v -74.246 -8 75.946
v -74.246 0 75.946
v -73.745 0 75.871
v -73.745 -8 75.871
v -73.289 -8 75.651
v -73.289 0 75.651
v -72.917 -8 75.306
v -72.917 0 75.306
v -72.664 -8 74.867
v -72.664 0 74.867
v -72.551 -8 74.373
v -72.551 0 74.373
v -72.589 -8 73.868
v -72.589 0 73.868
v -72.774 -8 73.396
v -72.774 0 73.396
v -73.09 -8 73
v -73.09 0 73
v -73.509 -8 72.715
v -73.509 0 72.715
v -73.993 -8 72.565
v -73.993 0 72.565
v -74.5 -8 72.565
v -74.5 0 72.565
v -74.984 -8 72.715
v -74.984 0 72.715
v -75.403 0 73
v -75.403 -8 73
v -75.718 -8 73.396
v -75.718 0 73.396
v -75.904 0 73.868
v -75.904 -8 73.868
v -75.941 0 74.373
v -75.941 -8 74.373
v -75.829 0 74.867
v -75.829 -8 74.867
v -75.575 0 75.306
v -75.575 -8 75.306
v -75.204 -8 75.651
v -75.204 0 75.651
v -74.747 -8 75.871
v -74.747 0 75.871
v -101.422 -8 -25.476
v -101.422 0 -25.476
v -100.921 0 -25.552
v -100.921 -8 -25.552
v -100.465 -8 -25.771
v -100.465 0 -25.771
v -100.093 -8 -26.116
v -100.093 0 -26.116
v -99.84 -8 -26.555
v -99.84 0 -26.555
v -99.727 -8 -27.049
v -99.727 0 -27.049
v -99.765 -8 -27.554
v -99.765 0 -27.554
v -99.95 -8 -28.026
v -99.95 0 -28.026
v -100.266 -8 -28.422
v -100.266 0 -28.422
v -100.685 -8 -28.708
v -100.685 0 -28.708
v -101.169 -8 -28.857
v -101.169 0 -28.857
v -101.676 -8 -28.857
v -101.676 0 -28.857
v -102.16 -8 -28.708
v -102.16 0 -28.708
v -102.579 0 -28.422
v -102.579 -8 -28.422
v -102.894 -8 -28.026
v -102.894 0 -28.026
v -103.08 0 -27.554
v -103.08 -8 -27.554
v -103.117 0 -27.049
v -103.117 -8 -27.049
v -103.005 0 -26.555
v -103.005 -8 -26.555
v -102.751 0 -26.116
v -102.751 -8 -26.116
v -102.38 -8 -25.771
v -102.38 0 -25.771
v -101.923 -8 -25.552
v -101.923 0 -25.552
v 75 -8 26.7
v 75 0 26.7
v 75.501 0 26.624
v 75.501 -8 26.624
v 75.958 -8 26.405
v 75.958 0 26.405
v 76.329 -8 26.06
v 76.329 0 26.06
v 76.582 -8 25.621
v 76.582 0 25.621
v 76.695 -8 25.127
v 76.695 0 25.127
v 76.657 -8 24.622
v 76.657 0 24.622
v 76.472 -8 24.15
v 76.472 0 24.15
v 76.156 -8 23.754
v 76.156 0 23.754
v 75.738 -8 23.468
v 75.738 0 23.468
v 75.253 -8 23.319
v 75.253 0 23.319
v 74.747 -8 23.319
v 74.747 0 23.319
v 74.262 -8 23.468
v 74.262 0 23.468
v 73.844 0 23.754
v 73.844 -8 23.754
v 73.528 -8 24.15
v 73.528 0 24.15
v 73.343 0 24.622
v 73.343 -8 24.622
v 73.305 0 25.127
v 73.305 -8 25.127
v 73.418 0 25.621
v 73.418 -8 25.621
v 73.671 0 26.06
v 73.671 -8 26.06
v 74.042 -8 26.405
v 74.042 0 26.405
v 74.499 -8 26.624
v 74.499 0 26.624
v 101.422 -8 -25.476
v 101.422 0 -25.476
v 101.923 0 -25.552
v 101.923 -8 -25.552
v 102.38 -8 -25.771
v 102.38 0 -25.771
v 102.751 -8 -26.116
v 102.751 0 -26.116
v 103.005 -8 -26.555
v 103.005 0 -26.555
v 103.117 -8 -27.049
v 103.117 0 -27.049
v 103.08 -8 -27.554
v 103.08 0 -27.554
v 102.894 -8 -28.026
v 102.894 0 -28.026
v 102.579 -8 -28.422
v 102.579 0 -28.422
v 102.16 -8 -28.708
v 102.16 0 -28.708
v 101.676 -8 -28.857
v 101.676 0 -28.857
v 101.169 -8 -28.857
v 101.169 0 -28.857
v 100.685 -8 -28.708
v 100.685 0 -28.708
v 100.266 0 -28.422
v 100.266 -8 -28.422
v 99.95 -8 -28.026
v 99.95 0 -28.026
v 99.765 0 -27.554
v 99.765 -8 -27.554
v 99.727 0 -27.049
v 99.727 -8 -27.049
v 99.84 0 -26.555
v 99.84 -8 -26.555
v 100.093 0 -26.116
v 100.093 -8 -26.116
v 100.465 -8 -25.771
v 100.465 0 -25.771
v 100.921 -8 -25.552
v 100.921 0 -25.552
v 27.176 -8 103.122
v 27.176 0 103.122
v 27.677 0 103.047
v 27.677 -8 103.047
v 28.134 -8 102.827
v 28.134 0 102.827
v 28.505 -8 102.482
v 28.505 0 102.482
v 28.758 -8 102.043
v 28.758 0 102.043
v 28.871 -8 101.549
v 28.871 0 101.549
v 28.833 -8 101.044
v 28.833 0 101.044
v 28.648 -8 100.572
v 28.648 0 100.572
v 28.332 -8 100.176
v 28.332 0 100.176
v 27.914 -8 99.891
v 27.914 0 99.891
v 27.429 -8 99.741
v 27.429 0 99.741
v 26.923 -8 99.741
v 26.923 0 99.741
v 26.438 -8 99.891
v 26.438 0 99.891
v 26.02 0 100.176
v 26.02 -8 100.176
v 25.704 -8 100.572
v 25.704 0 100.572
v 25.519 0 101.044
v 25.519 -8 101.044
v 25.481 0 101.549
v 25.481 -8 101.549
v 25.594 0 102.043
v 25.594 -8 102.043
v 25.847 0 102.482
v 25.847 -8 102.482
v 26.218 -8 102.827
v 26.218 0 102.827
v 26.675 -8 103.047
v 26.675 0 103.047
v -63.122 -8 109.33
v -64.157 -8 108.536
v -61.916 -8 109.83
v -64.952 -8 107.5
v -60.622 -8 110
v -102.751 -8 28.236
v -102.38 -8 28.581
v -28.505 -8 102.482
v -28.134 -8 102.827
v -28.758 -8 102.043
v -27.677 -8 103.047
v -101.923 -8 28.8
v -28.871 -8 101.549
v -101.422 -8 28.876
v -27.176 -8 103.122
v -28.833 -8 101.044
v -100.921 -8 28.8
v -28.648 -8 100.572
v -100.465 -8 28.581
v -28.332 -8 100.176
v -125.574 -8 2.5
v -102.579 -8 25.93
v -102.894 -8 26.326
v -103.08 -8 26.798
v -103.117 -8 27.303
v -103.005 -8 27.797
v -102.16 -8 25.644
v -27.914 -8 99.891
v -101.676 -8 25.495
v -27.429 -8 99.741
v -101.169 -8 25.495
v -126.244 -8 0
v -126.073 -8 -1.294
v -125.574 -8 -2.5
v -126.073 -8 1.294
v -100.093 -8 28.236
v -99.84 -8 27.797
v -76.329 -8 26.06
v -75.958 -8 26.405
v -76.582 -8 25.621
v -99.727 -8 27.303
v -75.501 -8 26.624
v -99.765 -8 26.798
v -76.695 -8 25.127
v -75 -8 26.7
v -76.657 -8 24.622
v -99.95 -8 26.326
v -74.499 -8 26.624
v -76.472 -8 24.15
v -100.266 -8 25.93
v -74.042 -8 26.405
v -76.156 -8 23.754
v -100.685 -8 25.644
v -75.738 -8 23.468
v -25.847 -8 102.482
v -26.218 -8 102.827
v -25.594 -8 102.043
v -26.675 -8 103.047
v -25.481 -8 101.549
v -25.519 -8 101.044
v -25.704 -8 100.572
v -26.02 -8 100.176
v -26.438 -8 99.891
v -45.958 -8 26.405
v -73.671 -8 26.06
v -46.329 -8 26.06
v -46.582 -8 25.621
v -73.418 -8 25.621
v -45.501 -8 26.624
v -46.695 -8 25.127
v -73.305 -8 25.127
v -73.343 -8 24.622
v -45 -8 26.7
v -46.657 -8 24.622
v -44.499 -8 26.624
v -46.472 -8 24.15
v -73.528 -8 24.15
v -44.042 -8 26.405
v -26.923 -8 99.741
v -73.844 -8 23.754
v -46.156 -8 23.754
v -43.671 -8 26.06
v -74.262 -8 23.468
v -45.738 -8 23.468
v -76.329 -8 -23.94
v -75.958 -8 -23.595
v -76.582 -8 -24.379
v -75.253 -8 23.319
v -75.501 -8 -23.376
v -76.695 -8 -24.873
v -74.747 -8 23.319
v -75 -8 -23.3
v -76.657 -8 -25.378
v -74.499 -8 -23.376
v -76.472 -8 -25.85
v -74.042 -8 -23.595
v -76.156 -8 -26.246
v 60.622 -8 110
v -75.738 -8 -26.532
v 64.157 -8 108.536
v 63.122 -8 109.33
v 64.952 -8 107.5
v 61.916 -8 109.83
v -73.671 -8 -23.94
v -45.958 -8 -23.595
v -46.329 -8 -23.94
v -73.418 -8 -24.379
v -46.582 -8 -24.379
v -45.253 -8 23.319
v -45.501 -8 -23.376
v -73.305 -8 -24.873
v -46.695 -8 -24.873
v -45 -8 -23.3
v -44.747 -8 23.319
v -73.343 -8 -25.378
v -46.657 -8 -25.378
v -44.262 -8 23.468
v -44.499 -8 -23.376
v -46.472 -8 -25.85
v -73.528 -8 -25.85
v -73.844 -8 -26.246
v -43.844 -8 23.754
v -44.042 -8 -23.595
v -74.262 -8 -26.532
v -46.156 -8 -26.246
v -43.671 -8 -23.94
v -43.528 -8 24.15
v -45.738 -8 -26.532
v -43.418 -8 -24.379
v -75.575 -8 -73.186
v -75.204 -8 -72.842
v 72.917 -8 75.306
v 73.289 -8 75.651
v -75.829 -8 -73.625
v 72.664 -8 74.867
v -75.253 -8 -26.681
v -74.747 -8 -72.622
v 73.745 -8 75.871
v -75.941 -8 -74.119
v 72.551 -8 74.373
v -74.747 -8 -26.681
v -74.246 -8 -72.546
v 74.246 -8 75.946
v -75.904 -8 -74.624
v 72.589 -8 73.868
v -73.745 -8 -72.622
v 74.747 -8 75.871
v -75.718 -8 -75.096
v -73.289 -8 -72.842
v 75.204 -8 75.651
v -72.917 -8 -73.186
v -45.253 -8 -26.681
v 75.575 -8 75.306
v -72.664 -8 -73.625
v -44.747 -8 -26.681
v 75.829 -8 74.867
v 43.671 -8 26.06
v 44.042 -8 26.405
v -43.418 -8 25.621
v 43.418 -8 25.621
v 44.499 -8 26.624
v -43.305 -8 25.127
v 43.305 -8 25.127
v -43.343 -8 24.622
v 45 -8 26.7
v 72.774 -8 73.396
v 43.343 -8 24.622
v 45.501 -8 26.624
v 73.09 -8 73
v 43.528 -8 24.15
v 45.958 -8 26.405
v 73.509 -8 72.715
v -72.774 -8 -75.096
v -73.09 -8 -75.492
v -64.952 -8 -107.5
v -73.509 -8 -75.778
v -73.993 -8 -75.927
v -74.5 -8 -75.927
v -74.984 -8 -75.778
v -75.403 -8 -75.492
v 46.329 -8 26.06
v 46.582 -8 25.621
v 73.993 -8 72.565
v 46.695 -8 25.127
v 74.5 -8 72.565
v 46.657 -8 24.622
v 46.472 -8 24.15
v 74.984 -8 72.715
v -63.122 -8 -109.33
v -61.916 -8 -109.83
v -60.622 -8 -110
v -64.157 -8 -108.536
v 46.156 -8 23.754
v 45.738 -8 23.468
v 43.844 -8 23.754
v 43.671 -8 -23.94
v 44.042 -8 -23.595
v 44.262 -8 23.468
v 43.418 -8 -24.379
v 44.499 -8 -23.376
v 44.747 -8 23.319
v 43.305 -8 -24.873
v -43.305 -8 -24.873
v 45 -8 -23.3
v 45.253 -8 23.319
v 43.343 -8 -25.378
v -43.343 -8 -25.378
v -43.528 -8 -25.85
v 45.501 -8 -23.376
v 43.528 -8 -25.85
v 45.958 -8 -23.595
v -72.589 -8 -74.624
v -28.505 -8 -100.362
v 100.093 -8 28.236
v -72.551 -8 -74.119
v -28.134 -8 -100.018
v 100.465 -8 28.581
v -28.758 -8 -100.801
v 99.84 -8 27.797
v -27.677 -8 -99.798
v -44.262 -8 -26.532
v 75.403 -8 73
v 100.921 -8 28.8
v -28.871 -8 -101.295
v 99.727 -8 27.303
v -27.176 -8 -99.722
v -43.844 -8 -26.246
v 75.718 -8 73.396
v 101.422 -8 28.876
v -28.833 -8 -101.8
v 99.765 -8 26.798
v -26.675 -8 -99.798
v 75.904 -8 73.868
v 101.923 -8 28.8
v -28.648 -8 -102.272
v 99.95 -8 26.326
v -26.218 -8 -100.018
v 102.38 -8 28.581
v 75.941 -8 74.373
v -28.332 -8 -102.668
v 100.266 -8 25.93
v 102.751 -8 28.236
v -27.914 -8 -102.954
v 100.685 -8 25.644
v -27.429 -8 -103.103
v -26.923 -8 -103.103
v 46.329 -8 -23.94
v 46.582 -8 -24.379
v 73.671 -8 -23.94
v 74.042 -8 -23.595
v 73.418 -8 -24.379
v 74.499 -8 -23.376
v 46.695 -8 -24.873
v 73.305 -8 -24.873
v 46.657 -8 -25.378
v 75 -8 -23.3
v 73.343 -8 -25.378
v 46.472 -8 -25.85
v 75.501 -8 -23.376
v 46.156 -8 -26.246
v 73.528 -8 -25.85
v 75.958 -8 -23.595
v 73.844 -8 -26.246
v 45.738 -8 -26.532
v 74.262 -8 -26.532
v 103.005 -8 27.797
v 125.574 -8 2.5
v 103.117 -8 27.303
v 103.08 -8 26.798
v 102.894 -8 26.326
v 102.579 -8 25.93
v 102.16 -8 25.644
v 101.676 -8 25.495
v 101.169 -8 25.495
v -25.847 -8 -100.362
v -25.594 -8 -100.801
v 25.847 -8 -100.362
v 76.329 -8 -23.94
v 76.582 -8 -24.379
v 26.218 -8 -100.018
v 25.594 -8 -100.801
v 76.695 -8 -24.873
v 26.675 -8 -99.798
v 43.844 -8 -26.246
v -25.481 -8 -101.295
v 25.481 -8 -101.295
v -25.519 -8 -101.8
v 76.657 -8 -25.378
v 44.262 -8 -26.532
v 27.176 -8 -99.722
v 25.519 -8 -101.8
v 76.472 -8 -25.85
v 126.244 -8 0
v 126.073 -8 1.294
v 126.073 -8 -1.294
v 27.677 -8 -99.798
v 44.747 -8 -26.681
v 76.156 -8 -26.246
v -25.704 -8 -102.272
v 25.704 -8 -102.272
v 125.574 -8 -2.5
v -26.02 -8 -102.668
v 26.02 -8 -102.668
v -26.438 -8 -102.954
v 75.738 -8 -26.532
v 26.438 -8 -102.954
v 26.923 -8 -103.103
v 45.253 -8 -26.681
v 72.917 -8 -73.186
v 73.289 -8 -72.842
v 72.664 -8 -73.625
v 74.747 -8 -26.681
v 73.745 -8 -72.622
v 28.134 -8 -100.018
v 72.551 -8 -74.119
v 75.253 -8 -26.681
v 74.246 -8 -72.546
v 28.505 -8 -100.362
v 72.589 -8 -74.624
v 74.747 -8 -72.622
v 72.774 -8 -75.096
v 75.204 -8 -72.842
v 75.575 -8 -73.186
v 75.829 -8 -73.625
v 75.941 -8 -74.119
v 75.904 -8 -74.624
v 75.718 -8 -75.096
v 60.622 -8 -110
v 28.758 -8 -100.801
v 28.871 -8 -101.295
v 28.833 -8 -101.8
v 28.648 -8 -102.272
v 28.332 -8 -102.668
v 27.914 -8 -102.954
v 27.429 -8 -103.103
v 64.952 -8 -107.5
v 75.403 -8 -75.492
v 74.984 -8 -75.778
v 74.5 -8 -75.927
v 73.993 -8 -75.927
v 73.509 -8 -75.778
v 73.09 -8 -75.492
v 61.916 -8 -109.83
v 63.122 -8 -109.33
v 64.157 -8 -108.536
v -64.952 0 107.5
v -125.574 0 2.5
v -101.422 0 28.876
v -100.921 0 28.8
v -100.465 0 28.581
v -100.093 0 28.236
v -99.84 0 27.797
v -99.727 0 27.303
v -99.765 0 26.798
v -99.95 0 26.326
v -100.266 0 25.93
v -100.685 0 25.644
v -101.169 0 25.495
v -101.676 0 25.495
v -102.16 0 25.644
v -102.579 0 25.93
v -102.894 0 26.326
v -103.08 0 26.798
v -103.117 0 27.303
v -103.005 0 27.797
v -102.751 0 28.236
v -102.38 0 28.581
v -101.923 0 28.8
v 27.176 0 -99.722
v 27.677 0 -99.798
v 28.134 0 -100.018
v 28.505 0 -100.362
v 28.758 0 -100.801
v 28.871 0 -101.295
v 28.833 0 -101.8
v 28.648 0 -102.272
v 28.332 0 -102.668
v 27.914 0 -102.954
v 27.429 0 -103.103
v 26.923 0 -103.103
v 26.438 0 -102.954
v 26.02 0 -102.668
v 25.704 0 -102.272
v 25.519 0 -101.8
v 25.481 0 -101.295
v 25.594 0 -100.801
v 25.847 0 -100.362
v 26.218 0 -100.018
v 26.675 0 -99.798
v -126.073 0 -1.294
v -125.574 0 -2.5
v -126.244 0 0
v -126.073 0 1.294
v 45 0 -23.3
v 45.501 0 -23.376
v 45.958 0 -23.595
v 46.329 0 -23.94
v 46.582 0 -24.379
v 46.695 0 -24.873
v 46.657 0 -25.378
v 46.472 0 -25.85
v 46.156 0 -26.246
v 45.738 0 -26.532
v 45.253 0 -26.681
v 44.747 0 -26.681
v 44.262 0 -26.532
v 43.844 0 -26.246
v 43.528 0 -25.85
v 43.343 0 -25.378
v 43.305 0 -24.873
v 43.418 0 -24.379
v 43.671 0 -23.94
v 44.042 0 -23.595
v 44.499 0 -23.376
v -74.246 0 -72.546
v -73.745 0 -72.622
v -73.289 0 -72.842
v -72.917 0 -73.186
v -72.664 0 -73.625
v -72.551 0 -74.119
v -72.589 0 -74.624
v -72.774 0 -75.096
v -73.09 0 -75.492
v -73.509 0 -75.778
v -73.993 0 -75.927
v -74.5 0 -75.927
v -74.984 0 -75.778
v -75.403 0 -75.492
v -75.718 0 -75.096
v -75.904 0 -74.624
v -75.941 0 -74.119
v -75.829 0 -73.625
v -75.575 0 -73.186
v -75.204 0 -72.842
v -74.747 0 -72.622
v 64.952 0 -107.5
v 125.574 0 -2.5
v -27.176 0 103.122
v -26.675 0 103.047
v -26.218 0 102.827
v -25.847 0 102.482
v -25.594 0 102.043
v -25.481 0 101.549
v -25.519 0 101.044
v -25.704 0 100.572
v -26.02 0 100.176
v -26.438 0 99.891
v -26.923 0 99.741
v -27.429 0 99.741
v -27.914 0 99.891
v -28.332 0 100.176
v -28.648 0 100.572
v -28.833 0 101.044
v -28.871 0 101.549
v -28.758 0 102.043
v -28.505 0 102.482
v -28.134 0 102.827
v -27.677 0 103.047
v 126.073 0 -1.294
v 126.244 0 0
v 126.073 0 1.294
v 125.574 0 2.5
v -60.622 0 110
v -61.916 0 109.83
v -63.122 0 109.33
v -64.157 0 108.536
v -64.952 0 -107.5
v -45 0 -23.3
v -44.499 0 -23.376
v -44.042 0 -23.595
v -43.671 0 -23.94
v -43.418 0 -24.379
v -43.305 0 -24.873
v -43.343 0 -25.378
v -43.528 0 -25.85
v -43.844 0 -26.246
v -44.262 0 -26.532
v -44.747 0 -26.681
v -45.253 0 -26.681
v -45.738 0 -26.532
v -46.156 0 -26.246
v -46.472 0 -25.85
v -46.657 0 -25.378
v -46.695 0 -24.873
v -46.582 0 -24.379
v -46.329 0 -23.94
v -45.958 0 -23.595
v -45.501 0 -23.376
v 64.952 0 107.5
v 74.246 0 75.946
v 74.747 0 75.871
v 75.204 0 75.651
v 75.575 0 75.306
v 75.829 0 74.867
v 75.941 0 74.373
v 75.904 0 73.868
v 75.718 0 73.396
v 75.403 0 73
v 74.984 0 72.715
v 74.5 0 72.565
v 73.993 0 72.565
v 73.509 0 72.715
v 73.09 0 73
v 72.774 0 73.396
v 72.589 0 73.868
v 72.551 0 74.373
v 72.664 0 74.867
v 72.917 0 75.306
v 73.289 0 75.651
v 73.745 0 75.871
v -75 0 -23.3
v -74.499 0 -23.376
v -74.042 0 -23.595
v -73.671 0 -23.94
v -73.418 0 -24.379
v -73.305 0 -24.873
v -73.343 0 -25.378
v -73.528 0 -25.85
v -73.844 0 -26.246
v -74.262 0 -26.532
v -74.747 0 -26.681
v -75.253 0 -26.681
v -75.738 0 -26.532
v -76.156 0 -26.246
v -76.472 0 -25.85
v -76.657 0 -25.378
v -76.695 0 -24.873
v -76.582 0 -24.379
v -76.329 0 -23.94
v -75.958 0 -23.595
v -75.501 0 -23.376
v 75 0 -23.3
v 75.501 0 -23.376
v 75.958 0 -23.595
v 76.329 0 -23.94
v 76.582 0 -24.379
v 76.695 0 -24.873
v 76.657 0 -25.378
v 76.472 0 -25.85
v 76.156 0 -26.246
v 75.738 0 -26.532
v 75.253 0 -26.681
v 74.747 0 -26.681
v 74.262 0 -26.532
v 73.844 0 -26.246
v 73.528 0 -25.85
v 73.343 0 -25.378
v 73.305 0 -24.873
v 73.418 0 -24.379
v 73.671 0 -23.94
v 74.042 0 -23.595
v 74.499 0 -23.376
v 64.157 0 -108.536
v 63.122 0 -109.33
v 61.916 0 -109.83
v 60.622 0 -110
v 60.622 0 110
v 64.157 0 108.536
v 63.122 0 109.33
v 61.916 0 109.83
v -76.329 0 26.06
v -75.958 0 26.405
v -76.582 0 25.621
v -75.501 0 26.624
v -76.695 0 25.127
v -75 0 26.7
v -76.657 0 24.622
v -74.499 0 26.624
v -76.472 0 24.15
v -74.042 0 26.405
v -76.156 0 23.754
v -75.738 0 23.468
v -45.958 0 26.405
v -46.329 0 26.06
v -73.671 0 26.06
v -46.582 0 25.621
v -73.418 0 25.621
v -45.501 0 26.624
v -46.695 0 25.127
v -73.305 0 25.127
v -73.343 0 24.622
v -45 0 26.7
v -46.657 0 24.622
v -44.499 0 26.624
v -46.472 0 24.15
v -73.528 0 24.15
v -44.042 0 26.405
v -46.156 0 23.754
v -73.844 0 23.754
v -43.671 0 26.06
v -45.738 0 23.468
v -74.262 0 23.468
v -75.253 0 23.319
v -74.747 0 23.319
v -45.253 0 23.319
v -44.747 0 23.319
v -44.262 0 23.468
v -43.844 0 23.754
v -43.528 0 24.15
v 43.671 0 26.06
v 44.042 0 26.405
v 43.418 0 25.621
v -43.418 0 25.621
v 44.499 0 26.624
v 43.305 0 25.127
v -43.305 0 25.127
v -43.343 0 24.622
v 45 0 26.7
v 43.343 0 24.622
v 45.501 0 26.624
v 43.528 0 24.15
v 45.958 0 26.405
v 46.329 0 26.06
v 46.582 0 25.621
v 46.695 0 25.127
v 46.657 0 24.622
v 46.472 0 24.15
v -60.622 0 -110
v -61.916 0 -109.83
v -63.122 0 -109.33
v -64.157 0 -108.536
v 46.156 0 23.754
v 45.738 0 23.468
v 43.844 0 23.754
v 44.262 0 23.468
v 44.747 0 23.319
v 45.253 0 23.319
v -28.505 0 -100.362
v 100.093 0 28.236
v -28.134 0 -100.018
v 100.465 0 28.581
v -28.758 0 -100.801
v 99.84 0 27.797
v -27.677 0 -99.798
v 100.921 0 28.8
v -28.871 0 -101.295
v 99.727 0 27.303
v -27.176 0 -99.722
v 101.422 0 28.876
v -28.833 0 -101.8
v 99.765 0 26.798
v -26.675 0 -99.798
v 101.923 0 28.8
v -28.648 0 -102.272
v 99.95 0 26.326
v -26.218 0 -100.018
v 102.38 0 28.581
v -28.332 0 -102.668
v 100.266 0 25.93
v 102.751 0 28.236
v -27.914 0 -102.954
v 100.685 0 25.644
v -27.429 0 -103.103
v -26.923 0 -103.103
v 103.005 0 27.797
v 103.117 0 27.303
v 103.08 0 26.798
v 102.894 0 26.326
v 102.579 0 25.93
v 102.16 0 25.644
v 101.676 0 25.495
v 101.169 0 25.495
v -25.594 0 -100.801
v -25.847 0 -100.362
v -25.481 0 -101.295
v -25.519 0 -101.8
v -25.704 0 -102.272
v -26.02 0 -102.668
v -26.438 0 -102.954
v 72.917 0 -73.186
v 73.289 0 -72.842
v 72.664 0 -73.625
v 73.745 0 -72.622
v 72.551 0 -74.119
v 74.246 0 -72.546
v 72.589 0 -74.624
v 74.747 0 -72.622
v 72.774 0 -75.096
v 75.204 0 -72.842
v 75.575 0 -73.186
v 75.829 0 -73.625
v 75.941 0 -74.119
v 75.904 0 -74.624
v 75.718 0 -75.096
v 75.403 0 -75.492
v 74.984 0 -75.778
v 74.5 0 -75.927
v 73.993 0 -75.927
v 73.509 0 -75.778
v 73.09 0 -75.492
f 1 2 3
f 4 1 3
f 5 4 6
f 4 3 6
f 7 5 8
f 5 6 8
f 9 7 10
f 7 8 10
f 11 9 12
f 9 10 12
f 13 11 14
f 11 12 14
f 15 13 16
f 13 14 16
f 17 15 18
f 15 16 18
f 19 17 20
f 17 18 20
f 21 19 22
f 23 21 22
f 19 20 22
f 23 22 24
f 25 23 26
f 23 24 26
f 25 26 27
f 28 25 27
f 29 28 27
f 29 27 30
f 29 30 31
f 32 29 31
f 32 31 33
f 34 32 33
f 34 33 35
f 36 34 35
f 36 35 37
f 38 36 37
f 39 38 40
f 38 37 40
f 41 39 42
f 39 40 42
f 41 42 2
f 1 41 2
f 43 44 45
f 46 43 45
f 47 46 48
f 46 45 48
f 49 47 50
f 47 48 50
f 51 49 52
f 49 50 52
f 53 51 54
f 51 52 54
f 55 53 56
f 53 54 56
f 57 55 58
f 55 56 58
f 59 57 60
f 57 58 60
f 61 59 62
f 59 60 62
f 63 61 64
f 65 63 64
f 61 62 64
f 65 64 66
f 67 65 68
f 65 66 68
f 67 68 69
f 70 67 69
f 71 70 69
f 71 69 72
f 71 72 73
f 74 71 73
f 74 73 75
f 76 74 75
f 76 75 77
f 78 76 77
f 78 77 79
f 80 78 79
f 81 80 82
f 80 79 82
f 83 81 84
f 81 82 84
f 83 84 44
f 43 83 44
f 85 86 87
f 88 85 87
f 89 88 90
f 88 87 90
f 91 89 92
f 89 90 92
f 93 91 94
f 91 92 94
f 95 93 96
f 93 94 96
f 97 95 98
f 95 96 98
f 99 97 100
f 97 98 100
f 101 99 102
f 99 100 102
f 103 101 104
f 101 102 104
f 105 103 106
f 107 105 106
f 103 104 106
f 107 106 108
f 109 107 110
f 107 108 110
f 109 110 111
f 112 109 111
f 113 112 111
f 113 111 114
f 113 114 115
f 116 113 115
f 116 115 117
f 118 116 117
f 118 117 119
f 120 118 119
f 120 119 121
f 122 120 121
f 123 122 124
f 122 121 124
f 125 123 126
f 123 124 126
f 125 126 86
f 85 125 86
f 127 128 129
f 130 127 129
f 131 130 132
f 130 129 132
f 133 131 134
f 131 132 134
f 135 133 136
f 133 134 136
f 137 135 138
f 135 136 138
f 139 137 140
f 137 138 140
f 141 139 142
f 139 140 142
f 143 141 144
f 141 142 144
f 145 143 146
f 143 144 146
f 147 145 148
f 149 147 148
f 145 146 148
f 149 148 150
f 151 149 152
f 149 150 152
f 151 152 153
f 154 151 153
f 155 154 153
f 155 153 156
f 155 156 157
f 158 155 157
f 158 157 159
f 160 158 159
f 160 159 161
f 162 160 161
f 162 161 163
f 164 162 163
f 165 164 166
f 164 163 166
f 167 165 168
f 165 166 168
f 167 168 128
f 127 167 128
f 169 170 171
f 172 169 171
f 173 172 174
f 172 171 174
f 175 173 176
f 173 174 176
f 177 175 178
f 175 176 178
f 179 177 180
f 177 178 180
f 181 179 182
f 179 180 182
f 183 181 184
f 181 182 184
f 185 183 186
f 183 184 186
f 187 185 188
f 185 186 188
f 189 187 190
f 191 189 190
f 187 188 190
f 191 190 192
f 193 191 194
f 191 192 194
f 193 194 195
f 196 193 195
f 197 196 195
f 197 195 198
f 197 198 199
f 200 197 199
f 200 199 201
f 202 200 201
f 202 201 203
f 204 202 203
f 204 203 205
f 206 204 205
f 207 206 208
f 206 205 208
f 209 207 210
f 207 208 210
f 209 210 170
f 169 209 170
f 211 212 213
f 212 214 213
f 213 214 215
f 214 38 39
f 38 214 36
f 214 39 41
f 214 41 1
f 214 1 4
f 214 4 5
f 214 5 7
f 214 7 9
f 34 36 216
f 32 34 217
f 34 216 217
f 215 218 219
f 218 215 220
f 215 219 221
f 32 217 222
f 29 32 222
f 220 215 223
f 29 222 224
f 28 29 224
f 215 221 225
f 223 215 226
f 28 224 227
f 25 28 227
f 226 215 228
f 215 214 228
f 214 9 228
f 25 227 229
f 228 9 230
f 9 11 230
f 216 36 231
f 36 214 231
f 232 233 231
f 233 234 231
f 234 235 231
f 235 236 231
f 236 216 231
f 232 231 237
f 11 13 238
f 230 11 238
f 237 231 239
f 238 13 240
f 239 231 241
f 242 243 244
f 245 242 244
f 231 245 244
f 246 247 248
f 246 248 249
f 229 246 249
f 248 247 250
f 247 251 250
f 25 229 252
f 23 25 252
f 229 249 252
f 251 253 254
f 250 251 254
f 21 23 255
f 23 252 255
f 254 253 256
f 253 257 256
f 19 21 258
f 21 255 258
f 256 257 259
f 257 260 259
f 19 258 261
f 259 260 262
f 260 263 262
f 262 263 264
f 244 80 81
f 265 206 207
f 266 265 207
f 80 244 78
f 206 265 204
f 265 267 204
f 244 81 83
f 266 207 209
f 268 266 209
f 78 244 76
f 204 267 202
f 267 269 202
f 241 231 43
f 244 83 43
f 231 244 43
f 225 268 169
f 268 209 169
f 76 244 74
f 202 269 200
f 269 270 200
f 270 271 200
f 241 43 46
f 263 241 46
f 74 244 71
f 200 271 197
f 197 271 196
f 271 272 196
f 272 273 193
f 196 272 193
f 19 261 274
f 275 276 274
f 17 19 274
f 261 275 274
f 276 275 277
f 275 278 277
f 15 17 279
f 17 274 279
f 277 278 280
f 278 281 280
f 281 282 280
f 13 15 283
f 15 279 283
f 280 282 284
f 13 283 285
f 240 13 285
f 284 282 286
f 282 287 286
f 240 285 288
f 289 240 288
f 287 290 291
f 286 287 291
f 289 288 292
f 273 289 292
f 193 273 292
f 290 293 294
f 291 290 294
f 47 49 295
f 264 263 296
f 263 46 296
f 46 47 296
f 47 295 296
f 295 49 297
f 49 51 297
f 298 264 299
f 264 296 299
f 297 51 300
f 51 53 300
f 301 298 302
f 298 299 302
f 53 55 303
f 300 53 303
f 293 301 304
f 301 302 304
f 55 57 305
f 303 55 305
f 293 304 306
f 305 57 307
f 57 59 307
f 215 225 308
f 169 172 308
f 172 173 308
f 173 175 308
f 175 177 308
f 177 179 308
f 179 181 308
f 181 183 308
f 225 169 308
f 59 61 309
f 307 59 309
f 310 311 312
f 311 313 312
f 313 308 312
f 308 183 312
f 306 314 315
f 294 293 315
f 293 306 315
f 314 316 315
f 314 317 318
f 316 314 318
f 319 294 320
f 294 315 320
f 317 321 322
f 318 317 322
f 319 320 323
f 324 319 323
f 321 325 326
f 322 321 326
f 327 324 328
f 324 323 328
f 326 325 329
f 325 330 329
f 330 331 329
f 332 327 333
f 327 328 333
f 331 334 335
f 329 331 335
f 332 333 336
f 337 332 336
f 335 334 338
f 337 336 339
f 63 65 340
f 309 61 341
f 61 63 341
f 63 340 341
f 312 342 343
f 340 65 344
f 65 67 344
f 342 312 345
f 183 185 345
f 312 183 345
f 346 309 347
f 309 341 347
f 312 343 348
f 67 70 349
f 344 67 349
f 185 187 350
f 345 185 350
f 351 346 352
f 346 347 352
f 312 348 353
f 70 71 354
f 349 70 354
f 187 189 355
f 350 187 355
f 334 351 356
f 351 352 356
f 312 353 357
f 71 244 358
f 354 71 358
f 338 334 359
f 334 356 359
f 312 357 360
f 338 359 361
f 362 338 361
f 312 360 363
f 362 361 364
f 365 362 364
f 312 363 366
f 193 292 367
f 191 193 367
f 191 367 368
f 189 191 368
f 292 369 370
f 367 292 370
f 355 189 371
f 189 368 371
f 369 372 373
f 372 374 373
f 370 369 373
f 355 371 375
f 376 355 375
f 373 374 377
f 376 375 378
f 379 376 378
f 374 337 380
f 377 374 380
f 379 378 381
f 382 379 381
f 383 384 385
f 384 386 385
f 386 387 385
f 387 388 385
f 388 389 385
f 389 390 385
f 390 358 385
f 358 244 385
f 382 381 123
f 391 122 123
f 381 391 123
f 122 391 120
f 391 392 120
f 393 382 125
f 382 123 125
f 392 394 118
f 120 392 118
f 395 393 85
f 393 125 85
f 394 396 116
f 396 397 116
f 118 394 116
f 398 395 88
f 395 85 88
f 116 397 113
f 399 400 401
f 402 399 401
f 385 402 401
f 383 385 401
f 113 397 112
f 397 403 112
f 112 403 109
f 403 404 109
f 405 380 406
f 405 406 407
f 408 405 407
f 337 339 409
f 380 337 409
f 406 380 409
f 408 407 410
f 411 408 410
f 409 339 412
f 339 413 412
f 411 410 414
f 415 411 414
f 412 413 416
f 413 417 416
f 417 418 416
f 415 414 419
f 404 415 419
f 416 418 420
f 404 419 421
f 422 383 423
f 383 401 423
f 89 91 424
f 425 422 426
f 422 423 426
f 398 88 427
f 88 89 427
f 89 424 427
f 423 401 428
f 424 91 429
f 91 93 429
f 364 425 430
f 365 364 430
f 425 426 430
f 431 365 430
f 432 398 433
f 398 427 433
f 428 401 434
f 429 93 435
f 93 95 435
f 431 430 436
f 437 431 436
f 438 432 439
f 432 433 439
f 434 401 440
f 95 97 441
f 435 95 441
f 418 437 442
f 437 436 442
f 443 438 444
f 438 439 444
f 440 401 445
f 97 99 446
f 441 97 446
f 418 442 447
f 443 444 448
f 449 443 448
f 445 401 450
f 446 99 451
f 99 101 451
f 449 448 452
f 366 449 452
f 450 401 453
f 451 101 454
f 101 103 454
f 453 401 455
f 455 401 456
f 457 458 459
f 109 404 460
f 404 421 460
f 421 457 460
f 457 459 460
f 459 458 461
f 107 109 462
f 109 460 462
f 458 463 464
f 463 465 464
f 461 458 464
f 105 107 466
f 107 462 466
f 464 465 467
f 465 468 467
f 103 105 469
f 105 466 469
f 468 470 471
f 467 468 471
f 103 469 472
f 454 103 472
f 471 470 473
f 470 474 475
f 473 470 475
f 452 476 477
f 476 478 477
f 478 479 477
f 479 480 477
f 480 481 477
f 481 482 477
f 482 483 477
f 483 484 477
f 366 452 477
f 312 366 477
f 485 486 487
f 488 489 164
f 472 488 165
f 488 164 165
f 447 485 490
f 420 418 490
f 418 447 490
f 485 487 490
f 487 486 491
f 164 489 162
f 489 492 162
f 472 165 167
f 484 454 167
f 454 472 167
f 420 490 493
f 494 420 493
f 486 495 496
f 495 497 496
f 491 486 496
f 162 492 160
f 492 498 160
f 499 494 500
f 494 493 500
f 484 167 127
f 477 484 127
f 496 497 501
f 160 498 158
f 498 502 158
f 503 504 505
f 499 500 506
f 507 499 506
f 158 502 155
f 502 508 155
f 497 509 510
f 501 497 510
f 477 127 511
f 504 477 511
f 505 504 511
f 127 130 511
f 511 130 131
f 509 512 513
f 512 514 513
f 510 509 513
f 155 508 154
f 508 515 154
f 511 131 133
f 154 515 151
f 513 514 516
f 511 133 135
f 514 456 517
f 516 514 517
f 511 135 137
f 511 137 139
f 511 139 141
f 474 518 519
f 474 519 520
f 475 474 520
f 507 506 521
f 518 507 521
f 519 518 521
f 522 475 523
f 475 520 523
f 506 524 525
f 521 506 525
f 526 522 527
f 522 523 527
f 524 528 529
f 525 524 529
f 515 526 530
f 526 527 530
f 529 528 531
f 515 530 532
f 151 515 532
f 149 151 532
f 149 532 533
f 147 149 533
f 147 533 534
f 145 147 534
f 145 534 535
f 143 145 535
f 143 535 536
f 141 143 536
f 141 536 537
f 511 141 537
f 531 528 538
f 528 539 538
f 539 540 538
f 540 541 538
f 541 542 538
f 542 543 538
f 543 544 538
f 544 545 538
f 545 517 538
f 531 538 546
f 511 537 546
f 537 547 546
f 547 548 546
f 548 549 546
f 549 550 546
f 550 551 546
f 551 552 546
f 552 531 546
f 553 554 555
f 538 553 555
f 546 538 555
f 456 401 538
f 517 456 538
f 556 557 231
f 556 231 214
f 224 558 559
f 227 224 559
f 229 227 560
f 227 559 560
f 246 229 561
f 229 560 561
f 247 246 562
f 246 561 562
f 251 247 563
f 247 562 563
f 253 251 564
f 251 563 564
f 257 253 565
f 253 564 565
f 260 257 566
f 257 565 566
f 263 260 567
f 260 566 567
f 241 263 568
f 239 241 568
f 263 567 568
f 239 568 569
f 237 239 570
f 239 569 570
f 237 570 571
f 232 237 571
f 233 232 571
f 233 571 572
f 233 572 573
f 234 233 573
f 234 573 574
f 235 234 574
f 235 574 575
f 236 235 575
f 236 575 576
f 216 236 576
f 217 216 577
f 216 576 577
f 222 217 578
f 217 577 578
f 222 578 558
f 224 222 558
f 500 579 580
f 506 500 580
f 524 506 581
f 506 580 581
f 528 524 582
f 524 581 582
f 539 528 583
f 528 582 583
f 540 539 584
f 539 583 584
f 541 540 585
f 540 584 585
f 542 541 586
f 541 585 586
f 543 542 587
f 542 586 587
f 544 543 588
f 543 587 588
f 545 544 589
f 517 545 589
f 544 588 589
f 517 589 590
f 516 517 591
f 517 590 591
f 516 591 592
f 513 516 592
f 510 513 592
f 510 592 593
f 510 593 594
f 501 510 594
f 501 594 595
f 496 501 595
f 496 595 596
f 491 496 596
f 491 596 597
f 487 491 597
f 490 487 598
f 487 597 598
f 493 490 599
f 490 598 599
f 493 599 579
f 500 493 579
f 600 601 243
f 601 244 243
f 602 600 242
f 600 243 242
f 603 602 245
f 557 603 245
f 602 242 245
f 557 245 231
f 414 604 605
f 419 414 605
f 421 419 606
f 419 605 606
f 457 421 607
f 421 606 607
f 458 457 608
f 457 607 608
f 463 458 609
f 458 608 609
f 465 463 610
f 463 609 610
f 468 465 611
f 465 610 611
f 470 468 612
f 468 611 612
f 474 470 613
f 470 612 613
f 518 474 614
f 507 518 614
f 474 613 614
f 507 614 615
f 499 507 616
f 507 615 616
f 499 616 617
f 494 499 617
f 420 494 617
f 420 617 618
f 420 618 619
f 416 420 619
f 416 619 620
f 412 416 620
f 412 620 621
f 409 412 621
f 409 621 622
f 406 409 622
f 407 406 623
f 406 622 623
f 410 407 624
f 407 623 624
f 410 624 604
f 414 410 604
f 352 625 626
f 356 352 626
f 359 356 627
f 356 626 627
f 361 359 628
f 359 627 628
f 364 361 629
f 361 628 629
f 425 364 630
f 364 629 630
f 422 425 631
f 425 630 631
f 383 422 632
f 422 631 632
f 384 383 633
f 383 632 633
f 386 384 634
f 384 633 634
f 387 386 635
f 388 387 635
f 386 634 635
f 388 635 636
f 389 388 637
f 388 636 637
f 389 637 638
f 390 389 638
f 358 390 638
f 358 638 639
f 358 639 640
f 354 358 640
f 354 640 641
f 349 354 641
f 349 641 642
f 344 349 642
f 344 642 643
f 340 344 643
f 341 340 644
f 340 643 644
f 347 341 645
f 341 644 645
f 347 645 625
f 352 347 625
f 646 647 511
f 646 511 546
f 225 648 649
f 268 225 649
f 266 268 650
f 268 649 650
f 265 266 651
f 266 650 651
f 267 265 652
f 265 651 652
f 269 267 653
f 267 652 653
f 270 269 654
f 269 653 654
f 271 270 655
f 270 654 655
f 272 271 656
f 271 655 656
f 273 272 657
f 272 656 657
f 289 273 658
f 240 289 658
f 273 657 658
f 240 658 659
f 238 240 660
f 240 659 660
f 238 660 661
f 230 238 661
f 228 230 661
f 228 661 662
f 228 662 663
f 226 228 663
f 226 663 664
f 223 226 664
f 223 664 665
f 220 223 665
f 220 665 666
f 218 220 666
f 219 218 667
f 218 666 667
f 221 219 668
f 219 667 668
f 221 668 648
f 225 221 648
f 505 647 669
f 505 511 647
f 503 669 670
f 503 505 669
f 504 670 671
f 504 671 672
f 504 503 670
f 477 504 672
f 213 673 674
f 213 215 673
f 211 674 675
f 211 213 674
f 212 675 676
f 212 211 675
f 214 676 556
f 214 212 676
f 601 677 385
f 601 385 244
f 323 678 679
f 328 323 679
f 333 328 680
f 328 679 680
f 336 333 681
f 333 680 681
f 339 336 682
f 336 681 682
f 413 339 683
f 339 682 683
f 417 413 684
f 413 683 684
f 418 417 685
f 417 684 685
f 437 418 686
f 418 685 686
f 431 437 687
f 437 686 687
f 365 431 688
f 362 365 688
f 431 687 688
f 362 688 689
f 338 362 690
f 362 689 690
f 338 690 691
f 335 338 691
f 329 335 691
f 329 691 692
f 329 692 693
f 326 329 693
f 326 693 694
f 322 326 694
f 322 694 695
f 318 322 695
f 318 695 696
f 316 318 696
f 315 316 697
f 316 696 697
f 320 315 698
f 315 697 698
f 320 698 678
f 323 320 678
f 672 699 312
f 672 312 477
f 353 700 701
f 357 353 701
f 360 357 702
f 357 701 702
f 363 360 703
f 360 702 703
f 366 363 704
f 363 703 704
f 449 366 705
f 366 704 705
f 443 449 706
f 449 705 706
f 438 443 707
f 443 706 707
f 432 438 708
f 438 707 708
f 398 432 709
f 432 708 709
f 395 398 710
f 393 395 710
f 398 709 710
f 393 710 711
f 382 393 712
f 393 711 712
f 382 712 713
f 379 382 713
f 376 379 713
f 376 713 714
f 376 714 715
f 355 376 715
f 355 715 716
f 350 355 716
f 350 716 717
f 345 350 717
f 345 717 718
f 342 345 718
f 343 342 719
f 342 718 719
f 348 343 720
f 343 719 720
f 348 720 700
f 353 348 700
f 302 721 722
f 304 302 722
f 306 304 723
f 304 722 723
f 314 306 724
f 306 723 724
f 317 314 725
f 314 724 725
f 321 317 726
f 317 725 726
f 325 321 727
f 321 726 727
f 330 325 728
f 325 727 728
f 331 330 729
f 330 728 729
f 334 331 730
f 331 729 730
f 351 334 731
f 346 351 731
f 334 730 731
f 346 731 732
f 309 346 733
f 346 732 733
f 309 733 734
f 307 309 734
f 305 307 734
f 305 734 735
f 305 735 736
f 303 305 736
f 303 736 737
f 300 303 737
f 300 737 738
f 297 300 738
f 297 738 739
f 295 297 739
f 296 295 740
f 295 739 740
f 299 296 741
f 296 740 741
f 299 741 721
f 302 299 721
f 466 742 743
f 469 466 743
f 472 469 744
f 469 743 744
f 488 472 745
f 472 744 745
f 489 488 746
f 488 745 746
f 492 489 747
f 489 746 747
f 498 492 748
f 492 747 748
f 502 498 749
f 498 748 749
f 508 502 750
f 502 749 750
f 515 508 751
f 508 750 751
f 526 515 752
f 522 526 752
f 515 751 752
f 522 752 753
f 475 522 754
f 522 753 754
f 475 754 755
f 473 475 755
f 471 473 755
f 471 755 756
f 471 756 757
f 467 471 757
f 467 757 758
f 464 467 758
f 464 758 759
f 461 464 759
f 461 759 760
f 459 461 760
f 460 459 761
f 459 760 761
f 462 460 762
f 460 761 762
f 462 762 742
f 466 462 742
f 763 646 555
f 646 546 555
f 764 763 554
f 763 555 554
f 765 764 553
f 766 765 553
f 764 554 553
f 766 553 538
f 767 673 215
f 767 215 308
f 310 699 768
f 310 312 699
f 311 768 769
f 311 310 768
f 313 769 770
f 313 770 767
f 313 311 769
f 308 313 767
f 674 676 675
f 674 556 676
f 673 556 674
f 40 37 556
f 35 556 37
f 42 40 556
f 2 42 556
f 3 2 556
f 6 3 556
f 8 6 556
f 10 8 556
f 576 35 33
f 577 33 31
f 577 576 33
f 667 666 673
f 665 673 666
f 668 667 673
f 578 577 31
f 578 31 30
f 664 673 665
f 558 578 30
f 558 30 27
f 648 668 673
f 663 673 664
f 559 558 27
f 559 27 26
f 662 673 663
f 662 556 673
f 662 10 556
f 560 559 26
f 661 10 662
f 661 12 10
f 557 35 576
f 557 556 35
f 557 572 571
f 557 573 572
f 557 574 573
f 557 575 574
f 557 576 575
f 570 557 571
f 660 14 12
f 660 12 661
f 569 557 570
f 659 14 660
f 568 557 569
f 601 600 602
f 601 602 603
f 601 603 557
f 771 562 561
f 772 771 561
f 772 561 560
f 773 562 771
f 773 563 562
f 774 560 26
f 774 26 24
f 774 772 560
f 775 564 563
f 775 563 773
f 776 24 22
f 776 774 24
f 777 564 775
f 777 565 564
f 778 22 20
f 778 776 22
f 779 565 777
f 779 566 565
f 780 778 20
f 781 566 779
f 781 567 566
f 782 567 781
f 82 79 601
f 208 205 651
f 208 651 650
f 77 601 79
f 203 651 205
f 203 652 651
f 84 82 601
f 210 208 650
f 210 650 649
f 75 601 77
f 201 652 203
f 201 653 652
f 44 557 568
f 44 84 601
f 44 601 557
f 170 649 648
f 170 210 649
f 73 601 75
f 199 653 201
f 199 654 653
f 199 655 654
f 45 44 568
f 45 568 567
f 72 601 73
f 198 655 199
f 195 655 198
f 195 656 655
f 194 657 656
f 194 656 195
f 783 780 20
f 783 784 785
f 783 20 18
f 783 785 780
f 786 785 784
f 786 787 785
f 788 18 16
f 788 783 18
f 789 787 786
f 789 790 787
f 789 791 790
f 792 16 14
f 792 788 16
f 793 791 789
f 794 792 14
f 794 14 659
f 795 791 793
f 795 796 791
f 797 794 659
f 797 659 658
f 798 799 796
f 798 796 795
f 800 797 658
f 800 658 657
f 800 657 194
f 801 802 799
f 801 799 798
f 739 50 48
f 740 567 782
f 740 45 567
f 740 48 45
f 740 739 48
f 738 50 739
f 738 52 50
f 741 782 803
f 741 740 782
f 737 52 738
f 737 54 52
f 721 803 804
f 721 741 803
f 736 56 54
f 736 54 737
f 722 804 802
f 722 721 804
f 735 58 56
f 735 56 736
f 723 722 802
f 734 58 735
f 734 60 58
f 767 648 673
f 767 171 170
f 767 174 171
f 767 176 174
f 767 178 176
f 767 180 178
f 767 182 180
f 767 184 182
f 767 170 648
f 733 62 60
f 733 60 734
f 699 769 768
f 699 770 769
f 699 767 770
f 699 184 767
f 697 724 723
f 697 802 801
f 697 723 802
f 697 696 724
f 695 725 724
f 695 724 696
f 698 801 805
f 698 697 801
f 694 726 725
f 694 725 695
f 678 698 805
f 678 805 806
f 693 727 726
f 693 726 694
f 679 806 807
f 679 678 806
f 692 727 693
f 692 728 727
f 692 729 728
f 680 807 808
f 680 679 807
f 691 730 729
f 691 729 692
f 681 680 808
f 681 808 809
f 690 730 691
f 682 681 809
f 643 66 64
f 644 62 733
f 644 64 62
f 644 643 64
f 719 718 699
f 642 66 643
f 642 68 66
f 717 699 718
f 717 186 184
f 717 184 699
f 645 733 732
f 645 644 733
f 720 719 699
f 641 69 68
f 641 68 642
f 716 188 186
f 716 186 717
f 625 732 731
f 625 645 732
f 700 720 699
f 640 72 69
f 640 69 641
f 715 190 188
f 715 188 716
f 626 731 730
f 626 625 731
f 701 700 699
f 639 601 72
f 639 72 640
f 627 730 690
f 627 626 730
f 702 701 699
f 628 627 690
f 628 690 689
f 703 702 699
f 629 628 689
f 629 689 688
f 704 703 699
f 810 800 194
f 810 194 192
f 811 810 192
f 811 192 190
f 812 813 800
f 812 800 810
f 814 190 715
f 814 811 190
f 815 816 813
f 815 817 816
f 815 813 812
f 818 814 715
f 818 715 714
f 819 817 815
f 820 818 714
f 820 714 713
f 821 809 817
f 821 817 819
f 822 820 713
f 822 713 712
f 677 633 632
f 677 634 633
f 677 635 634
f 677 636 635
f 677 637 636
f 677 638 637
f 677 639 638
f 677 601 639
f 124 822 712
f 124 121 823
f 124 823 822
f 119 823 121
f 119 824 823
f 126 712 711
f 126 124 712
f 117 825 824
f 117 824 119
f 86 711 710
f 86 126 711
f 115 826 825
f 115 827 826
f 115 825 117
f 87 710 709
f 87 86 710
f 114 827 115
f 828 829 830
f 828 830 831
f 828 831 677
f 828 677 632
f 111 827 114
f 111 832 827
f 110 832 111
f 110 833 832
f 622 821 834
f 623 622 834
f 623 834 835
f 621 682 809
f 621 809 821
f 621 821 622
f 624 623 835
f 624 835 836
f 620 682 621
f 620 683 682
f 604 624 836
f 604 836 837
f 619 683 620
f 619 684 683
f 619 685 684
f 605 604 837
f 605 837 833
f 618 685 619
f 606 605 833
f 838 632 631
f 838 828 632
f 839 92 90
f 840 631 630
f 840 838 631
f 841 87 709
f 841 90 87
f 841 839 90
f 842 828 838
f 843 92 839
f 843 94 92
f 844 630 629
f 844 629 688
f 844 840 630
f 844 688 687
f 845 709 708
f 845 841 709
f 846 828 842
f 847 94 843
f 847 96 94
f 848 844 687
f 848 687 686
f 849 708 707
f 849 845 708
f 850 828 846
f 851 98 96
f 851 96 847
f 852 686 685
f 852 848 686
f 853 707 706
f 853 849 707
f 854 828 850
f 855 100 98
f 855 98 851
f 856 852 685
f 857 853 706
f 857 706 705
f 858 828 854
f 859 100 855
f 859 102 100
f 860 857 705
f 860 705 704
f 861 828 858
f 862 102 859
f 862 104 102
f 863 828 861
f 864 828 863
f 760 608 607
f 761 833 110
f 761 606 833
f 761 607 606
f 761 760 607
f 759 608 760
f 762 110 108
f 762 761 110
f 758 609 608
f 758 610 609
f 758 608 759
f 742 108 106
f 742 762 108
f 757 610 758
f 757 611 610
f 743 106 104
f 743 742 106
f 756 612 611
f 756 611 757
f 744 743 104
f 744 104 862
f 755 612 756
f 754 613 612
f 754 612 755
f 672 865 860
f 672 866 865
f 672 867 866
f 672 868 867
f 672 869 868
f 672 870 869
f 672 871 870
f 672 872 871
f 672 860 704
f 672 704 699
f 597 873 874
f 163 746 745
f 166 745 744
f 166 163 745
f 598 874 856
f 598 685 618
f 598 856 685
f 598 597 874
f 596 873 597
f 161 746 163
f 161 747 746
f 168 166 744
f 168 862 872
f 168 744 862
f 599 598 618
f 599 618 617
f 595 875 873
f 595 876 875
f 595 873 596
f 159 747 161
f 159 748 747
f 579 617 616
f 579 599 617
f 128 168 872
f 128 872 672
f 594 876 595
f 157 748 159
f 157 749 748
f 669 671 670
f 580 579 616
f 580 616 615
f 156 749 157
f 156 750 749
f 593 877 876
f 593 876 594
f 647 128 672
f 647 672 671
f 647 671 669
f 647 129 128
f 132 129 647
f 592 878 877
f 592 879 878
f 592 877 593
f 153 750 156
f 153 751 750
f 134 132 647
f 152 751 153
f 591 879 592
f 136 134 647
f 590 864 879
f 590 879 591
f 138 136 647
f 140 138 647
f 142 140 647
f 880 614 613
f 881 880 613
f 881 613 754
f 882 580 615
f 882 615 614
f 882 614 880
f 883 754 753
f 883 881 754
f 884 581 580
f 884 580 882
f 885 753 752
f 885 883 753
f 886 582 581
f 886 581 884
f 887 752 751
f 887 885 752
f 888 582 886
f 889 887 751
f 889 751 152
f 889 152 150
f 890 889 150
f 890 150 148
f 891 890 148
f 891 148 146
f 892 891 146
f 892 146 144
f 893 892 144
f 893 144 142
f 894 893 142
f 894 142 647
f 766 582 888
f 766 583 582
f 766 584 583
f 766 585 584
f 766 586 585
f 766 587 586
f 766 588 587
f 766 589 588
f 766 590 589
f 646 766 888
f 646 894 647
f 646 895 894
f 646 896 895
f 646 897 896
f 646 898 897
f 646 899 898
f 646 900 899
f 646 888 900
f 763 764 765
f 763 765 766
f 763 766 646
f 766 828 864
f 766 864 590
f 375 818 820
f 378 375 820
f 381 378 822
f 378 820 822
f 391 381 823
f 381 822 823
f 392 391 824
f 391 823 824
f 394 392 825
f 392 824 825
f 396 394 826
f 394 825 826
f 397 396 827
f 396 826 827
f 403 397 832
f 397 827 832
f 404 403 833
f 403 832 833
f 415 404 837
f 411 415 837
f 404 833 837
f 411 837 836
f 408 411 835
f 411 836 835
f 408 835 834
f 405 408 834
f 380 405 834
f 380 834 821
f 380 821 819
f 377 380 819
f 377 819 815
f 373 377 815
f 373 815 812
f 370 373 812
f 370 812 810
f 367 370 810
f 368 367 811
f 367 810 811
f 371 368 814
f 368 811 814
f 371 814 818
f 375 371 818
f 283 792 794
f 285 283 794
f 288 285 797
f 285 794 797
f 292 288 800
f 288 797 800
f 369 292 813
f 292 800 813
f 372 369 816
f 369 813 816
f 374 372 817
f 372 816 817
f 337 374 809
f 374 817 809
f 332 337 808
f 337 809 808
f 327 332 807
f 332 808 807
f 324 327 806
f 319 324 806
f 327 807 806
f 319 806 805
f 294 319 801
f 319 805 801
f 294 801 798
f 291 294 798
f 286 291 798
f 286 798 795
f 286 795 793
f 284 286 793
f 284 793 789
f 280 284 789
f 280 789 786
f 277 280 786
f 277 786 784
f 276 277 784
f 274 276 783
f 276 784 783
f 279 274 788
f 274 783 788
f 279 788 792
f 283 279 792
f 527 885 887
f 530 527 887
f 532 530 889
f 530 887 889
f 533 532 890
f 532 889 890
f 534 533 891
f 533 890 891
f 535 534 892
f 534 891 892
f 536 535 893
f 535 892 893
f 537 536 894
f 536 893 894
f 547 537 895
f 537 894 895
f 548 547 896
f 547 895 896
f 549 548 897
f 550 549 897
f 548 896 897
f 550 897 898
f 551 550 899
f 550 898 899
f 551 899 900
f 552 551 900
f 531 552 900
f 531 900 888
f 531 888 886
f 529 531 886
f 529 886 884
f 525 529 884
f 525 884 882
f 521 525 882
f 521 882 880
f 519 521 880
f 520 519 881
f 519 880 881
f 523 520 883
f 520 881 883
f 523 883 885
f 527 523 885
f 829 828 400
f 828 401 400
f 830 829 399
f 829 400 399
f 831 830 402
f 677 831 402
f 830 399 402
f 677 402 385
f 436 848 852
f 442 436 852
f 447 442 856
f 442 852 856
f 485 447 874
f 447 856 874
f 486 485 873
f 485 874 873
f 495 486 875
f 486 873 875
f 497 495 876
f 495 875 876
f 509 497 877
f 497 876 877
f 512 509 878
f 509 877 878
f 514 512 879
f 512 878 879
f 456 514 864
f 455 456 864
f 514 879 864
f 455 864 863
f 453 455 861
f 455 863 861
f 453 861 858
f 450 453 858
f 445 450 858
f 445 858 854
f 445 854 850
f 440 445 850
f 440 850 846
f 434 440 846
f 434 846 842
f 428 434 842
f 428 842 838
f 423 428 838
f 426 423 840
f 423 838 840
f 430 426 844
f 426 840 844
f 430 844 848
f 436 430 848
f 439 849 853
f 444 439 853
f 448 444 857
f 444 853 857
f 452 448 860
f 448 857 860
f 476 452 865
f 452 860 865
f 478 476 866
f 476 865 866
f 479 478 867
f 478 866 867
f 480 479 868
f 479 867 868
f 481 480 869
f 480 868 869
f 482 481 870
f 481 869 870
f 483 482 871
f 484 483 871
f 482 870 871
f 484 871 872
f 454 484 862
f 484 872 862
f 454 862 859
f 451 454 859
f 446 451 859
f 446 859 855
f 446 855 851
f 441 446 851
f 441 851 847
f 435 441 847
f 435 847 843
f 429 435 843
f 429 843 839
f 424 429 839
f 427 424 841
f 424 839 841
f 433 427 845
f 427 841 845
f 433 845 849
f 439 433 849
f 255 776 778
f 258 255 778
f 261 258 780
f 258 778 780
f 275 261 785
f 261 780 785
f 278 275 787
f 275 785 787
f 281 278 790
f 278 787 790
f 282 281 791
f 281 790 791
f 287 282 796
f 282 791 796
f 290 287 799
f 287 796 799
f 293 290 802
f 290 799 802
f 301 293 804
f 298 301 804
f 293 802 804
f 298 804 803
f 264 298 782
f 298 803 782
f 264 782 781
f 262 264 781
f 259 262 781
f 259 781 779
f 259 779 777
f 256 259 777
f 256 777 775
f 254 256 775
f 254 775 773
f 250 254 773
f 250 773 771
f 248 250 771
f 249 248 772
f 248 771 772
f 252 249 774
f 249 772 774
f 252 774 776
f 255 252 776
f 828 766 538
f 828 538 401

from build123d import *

# Parameters (mm, degrees)
SKETCH1_R          = 1.7
BASE_FLANGE1_DEPTH = 8
FILLET2_R          = 5


# Sheet-metal steps are written as plain solids
with BuildPart() as part:
    # Sketch1 → Base-Flange1 (new body)
    with BuildSketch(Plane(origin=(0, 0, 0), x_dir=(1, 0, 0), z_dir=(0, 1, 0))):
        Polygon((127.017059222, 0), (63.508529611, 110), (-63.508529611, 110), (-127.017059222, 0), (-63.508529611, -110), (63.508529611, -110), align=None)
        with Locations(Location((-75, 25, 0), (0, 0, 270))):
            Circle(SKETCH1_R, mode=Mode.SUBTRACT)
        with Locations(Location((-75, -25, 0), (0, 0, 270))):
            Circle(SKETCH1_R, mode=Mode.SUBTRACT)
        with Locations(Location((75, 25, 0), (0, 0, 270))):
            Circle(SKETCH1_R, mode=Mode.SUBTRACT)
        with Locations(Location((75, -25, 0), (0, 0, 270))):
            Circle(SKETCH1_R, mode=Mode.SUBTRACT)
        with Locations(Location((-45, 25, 0), (0, 0, 270))):
            Circle(SKETCH1_R, mode=Mode.SUBTRACT)
        with Locations(Location((-45, -25, 0), (0, 0, 270))):
            Circle(SKETCH1_R, mode=Mode.SUBTRACT)
        with Locations(Location((45, 25, 0), (0, 0, 270))):
            Circle(SKETCH1_R, mode=Mode.SUBTRACT)
        with Locations(Location((45, -25, 0), (0, 0, 270))):
            Circle(SKETCH1_R, mode=Mode.SUBTRACT)
        with Locations(Location((-74.246212025, -74.246212025, 0), (0, 0, 270))):
            Circle(SKETCH1_R, mode=Mode.SUBTRACT)
        with Locations(Location((-101.42221176, -27.175999736, 0), (0, 0, 270))):
            Circle(SKETCH1_R, mode=Mode.SUBTRACT)
        with Locations(Location((-101.42221176, 27.175999736, 0), (0, 0, 270))):
            Circle(SKETCH1_R, mode=Mode.SUBTRACT)
        with Locations(Location((-74.246212025, 74.246212025, 0), (0, 0, 270))):
            Circle(SKETCH1_R, mode=Mode.SUBTRACT)
        with Locations(Location((-27.175999736, 101.42221176, 0), (0, 0, 270))):
            Circle(SKETCH1_R, mode=Mode.SUBTRACT)
        with Locations(Location((27.175999736, 101.42221176, 0), (0, 0, 270))):
            Circle(SKETCH1_R, mode=Mode.SUBTRACT)
        with Locations(Location((74.246212025, 74.246212025, 0), (0, 0, 270))):
            Circle(SKETCH1_R, mode=Mode.SUBTRACT)
        with Locations(Location((101.42221176, 27.175999736, 0), (0, 0, 270))):
            Circle(SKETCH1_R, mode=Mode.SUBTRACT)
        with Locations(Location((101.42221176, -27.175999736, 0), (0, 0, 270))):
            Circle(SKETCH1_R, mode=Mode.SUBTRACT)
        with Locations(Location((74.246212025, -74.246212025, 0), (0, 0, 270))):
            Circle(SKETCH1_R, mode=Mode.SUBTRACT)
        with Locations(Location((27.175999736, -101.42221176, 0), (0, 0, 270))):
            Circle(SKETCH1_R, mode=Mode.SUBTRACT)
        with Locations(Location((-27.175999736, -101.42221176, 0), (0, 0, 270))):
            Circle(SKETCH1_R, mode=Mode.SUBTRACT)
    extrude(amount=-BASE_FLANGE1_DEPTH)

    # Fillet2
    fillet2_edges = [part.edges().sort_by_distance(p)[0] for p in [
        (63.508529611, -4, 110),
        (-63.508529611, -4, 110),
        (-127.017059222, -4, 0),
        (-63.508529611, -4, -110),
        (63.508529611, -4, -110),
        (127.017059222, -4, 0),
    ]]
    fillet(fillet2_edges, radius=FILLET2_R)


solid = part.part
